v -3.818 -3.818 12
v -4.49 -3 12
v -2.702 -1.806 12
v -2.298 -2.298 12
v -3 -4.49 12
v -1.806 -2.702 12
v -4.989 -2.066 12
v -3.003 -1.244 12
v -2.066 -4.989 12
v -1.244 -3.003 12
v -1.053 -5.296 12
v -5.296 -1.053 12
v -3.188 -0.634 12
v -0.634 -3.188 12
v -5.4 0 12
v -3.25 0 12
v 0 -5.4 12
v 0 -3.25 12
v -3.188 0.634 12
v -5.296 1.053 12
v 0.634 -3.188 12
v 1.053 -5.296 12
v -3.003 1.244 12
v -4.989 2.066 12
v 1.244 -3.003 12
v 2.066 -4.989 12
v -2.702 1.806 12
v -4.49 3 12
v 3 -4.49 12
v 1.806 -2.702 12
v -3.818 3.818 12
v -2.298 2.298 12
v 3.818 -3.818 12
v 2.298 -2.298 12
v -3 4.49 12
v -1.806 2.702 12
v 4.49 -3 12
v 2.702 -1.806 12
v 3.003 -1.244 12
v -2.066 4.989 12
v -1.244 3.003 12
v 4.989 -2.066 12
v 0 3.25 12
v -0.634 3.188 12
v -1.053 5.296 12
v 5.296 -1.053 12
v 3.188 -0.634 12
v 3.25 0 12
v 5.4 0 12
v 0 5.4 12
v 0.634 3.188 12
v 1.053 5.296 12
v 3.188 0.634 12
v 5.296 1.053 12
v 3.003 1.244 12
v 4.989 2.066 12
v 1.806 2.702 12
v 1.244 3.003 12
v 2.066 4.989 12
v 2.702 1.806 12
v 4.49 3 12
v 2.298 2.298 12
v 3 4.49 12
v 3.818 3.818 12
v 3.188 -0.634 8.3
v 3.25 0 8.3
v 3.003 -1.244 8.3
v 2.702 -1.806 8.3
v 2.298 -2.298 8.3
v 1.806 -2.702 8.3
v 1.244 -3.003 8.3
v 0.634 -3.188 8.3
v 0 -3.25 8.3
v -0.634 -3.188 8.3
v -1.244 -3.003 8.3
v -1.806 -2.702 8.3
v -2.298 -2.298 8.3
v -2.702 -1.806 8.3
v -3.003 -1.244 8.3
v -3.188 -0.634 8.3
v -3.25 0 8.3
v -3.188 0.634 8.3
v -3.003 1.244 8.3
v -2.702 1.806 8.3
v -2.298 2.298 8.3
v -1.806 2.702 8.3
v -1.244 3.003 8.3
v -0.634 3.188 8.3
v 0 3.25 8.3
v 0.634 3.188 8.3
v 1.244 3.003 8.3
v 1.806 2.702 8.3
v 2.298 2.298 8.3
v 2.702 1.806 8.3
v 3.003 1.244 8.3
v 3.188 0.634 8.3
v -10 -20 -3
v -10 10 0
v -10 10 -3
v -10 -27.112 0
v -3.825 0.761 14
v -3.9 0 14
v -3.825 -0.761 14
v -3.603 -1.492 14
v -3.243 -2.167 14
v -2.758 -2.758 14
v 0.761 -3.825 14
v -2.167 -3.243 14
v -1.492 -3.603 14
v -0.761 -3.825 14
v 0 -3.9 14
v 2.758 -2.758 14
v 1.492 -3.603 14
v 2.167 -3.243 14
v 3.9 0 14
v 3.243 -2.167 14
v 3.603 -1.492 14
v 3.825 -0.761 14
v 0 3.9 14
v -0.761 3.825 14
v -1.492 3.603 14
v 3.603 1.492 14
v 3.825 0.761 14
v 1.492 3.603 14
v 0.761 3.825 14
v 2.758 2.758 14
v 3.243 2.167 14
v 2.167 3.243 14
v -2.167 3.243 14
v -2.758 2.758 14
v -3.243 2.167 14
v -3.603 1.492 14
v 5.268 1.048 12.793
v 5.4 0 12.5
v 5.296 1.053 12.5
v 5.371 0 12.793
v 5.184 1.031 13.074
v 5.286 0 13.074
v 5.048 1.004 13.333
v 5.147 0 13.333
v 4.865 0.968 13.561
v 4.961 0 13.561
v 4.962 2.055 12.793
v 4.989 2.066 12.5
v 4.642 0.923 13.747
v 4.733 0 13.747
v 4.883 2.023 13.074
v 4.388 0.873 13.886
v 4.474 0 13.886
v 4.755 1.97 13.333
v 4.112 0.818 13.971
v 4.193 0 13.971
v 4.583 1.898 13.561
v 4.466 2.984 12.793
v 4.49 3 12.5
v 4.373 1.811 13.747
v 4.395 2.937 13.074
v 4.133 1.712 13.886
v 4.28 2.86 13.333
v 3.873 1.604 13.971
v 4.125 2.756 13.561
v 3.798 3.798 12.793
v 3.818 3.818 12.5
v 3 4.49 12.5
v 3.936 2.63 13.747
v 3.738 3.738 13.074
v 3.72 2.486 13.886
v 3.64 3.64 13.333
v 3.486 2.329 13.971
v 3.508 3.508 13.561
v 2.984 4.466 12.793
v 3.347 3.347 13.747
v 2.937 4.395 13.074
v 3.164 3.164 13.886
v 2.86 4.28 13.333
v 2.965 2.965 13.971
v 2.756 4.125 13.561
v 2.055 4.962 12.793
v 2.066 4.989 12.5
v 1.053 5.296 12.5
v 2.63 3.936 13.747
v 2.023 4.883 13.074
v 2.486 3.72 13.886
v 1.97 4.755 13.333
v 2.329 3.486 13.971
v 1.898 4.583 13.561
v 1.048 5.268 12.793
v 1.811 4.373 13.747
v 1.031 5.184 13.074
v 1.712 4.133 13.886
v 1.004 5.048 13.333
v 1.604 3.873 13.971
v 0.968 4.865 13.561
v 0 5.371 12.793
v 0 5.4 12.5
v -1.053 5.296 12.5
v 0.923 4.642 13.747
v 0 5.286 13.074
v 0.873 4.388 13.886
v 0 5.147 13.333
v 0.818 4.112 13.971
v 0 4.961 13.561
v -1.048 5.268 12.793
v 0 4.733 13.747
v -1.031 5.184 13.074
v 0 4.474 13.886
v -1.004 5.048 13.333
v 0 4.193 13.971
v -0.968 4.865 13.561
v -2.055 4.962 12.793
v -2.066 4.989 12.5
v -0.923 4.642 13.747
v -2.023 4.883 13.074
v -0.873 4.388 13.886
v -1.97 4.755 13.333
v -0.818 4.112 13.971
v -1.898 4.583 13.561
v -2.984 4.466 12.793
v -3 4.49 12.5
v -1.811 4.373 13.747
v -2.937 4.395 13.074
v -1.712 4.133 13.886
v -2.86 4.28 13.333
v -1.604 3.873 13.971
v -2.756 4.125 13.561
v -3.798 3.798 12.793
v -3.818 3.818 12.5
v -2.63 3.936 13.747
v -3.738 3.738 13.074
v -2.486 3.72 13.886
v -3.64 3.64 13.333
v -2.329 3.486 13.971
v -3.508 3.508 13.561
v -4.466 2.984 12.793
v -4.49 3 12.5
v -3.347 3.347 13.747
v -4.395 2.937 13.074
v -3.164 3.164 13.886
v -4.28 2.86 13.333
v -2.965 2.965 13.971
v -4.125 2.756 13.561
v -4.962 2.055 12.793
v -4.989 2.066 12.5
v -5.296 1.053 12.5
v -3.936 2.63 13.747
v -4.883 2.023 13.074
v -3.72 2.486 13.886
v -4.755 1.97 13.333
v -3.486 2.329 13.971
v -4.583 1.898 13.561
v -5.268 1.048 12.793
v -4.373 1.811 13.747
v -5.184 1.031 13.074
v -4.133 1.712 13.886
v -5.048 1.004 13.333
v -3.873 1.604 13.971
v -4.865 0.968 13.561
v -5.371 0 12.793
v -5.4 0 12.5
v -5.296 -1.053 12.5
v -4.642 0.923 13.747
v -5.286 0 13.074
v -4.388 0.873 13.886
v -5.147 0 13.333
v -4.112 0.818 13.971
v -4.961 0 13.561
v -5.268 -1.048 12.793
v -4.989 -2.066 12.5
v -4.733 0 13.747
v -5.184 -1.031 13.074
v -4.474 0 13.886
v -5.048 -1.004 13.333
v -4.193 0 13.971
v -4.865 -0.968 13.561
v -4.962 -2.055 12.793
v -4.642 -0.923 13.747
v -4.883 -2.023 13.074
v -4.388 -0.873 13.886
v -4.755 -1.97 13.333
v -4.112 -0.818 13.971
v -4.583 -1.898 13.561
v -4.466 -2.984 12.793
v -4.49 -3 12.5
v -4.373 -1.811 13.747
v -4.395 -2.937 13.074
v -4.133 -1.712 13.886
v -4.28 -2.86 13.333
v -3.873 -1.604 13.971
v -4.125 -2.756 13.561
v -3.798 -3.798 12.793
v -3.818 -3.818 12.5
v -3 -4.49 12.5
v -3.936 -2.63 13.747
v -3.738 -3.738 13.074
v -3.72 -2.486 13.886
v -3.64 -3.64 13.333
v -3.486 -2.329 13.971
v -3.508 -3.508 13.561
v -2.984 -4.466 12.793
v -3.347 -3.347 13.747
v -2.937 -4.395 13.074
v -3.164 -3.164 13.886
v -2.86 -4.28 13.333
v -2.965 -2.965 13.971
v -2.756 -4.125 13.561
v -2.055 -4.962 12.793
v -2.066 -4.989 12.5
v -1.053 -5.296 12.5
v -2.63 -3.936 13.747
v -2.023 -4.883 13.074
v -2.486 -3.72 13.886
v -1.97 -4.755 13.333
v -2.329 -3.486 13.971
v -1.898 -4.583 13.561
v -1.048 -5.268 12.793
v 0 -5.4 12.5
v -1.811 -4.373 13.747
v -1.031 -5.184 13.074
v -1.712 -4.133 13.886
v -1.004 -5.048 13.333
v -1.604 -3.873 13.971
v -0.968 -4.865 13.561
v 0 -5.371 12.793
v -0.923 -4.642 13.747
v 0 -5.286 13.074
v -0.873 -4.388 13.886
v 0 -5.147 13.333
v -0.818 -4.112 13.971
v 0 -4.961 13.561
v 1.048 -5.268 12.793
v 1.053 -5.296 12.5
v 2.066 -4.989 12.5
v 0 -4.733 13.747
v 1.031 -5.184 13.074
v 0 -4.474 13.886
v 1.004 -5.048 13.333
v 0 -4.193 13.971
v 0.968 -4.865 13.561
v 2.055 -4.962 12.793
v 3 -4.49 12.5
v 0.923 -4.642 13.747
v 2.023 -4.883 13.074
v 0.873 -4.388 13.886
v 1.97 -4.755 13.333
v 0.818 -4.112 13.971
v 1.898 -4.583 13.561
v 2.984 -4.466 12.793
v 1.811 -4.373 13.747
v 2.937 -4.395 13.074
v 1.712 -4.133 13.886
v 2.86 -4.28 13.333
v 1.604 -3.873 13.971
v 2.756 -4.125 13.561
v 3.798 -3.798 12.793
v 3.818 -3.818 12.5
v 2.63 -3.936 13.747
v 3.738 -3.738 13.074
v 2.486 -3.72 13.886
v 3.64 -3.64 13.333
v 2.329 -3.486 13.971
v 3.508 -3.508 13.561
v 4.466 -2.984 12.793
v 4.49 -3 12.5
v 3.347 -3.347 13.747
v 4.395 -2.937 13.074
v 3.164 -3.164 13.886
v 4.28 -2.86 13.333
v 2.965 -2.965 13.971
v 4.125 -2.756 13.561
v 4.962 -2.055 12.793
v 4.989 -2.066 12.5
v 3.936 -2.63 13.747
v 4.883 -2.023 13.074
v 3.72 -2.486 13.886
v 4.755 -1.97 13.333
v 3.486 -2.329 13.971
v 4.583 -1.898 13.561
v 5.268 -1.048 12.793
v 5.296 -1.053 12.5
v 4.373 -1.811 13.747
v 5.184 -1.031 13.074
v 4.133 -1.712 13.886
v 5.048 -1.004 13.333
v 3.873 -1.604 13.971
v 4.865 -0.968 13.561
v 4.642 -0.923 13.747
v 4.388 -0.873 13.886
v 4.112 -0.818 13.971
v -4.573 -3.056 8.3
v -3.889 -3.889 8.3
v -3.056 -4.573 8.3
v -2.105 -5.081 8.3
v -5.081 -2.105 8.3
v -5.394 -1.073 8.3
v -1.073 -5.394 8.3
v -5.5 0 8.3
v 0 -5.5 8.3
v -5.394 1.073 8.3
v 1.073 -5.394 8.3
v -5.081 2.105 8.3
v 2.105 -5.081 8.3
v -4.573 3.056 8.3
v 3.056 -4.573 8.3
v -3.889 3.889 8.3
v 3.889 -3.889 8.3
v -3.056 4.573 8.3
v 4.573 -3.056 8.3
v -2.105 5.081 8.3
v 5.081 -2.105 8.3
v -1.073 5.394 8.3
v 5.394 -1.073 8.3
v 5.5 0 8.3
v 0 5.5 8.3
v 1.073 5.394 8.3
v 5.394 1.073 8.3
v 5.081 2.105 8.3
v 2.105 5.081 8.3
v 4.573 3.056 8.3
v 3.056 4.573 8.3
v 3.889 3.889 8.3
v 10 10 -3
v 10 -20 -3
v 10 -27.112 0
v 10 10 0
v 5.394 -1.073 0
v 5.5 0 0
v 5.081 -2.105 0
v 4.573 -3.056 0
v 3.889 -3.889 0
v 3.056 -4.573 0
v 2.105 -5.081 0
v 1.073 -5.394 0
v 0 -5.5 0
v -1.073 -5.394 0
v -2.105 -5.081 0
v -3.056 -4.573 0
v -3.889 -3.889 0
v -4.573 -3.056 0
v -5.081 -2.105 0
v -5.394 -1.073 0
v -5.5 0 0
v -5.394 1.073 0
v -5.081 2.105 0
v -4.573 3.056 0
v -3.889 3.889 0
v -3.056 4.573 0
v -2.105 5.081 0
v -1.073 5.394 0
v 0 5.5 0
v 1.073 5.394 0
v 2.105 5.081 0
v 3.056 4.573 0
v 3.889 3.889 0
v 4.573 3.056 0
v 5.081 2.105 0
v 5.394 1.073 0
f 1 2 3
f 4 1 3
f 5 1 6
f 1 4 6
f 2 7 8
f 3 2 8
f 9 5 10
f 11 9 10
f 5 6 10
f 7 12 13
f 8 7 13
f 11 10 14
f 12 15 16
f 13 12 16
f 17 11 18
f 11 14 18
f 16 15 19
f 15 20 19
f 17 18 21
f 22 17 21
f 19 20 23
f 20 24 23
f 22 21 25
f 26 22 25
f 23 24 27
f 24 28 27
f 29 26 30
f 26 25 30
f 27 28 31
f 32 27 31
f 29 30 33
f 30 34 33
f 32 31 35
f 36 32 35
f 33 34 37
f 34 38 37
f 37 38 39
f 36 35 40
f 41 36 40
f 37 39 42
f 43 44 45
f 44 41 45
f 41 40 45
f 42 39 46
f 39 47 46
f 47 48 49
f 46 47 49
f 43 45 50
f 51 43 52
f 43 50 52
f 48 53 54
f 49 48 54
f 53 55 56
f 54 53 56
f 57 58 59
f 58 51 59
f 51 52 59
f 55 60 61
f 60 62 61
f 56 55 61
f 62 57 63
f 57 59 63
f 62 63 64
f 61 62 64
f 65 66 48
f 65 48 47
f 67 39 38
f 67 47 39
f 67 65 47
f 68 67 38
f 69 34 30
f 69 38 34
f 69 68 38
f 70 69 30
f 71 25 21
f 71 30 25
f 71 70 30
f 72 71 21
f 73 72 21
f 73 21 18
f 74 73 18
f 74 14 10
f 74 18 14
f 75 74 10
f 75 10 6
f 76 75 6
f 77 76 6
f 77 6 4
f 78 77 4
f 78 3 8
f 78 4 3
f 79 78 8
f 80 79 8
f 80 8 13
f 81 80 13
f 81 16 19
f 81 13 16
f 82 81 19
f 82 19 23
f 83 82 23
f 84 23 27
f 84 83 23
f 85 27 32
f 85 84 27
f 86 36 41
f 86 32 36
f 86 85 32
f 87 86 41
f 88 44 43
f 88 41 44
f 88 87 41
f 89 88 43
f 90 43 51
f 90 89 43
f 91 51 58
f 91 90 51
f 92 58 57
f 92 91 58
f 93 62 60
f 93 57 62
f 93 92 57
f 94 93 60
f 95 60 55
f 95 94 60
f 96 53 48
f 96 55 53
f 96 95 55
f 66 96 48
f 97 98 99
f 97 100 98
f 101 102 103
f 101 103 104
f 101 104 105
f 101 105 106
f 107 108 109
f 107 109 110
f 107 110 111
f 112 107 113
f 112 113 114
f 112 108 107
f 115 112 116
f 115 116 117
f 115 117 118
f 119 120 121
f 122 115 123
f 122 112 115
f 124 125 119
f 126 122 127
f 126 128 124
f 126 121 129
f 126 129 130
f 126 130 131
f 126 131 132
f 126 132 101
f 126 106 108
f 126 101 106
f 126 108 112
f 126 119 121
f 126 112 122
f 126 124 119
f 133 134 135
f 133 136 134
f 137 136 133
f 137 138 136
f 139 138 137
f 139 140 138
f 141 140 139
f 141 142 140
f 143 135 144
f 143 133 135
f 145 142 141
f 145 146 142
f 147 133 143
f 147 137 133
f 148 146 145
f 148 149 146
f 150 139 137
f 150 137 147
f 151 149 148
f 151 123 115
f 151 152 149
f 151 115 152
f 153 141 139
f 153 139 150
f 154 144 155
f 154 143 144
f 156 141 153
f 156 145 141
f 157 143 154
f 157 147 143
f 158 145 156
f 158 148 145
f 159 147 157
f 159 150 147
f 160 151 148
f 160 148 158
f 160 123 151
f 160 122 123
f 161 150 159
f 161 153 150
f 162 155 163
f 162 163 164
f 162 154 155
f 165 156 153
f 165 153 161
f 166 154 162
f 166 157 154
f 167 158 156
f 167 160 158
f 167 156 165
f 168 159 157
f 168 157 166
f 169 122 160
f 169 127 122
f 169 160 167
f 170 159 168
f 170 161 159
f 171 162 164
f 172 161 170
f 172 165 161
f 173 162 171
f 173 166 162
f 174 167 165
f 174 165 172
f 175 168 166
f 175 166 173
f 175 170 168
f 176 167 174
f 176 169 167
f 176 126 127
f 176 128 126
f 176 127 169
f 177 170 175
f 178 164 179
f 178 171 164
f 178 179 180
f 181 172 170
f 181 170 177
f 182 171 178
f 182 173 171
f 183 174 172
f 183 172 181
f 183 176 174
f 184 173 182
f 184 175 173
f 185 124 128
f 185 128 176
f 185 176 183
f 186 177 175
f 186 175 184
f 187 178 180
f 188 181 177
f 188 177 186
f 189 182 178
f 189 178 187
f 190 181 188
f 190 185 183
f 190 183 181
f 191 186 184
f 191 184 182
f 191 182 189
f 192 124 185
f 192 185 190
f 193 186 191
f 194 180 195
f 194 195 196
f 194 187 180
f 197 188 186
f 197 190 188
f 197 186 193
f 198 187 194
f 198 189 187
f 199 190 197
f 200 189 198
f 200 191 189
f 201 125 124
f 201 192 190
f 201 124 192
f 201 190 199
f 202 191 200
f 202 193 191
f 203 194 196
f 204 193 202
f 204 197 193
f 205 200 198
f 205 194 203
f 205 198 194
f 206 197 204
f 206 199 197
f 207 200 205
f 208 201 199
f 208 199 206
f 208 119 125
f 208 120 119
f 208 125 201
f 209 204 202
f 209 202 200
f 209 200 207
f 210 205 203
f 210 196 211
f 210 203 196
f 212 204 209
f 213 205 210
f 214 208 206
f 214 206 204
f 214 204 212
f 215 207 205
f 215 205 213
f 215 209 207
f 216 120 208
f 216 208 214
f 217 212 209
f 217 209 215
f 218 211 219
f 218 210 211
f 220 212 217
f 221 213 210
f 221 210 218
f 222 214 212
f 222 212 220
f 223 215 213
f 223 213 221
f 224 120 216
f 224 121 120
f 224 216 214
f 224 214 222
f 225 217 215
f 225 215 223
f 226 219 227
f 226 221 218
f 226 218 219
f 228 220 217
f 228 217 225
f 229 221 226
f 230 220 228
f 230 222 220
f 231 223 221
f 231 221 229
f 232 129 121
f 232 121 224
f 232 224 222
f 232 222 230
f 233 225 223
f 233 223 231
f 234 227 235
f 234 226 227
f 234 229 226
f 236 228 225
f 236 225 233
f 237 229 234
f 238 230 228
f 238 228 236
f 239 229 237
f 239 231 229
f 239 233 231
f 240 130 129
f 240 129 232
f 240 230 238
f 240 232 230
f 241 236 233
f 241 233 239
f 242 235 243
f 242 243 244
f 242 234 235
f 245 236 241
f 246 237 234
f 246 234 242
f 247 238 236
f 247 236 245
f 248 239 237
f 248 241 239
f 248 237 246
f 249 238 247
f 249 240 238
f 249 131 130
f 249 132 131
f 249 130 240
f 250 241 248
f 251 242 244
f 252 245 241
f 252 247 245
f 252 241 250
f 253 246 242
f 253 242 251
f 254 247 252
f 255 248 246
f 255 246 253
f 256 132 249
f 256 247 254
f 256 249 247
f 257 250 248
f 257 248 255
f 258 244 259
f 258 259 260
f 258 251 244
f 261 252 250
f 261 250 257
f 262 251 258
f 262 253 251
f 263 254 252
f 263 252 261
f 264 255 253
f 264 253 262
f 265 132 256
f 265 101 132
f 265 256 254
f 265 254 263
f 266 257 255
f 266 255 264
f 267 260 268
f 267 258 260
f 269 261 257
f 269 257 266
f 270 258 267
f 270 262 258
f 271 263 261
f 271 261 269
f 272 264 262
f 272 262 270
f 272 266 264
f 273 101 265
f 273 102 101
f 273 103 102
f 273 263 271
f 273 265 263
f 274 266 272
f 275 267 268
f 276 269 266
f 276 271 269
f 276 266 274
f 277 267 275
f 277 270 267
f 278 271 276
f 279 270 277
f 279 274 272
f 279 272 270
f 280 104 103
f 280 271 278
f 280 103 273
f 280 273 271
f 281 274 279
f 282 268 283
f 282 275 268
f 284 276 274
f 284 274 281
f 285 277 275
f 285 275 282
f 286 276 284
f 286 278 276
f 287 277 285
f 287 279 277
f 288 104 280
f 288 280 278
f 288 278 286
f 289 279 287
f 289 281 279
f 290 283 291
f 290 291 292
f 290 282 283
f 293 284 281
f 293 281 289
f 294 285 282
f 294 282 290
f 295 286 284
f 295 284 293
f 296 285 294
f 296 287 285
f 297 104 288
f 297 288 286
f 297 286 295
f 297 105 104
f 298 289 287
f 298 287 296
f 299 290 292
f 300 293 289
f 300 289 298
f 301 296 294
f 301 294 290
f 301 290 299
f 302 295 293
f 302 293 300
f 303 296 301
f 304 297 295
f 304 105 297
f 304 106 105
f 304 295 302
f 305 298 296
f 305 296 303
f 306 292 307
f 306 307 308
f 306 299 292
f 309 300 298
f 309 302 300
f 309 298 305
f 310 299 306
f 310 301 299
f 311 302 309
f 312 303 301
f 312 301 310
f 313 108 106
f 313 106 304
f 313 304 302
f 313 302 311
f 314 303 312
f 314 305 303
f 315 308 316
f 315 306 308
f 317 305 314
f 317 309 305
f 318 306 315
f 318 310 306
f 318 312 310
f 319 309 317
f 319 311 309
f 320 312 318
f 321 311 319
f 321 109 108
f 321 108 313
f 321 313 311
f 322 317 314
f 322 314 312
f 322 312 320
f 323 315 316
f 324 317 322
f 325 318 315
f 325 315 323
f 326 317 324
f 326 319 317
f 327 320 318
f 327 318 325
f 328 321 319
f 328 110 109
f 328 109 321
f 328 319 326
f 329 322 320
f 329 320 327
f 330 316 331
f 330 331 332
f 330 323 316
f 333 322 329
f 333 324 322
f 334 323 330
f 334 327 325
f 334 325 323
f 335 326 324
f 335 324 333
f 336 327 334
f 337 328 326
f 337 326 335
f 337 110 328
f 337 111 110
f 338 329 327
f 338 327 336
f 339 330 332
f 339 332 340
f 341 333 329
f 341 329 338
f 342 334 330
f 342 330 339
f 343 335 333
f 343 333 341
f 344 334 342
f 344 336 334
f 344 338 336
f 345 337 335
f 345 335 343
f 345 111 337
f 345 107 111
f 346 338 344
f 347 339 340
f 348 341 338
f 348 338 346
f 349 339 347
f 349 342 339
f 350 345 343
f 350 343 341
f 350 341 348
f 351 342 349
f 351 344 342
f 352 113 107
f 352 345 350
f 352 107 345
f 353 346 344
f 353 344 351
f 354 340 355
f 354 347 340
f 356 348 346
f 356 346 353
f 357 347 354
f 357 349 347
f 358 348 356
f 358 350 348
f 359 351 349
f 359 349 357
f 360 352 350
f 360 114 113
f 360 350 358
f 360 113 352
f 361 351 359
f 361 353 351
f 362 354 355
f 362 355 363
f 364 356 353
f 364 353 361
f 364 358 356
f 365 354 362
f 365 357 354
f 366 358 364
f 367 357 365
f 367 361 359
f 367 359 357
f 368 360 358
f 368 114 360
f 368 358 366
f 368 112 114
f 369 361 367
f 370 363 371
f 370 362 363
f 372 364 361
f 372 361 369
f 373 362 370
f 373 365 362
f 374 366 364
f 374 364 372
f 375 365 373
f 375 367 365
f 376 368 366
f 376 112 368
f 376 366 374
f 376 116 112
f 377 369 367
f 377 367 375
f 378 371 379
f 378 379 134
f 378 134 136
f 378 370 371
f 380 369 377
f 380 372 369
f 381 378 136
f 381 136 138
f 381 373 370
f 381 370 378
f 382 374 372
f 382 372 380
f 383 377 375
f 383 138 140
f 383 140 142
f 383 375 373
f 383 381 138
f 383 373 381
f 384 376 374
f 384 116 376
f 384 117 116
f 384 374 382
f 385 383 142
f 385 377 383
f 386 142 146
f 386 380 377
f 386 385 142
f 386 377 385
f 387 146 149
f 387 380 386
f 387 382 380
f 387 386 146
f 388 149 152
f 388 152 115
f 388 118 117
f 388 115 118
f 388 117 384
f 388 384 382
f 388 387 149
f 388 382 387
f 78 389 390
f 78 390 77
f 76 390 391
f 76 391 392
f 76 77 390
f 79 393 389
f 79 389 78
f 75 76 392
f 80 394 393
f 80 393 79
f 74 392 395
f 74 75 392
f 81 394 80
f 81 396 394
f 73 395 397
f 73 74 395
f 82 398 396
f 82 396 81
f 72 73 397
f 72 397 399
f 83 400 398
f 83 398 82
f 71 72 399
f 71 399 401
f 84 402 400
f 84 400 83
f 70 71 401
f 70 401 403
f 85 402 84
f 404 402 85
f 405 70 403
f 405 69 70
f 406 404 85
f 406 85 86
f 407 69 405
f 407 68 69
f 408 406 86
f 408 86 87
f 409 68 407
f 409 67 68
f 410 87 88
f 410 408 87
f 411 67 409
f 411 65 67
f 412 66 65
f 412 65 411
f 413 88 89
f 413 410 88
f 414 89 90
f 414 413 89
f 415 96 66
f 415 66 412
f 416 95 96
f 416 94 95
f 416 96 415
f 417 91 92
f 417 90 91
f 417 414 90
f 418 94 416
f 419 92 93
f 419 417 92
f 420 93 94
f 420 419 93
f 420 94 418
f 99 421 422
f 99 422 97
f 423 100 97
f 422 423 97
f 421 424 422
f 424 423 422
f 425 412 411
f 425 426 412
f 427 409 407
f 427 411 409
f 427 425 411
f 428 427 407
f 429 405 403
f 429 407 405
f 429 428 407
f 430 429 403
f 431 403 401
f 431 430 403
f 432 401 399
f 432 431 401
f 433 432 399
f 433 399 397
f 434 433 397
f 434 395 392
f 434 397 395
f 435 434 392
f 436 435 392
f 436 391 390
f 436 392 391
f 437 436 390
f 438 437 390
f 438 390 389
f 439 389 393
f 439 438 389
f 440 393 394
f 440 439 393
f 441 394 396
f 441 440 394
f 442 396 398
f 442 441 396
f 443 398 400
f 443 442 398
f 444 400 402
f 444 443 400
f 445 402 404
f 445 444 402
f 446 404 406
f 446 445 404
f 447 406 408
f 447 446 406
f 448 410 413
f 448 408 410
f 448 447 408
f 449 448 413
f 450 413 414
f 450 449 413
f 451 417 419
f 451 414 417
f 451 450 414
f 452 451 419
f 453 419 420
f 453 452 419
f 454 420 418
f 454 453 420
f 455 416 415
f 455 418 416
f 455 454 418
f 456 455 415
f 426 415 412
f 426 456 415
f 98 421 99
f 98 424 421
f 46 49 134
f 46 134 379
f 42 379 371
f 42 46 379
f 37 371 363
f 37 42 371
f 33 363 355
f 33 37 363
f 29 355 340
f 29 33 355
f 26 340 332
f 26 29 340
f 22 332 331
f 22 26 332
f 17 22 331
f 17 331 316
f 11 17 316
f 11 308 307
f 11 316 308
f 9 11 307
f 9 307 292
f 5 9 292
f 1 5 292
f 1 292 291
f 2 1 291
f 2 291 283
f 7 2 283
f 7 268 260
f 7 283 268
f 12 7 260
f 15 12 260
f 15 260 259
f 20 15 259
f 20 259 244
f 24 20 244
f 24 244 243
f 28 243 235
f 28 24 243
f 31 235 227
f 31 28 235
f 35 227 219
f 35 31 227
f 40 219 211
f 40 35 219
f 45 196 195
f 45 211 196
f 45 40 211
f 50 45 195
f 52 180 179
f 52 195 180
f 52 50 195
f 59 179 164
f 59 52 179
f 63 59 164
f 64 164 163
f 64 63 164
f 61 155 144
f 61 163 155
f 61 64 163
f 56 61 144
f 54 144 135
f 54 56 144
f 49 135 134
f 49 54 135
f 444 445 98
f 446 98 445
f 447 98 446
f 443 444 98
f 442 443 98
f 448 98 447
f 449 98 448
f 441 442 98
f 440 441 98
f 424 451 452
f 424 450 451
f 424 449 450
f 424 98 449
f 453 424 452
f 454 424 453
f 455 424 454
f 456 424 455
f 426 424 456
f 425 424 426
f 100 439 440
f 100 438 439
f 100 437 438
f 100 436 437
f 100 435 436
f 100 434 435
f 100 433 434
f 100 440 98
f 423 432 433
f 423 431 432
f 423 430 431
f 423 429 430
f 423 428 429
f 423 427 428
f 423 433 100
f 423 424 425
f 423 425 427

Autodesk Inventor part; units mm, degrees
ref_plane "YZ Plane" through (0, 0, 0) normal (1, 0, 0) x (0, 1, 0)
ref_plane "XZ Plane" through (0, 0, 0) normal (0, 1, 0) x (-1, 0, 0)
ref_plane "XY Plane" through (0, 0, 0) normal (0, 0, 1) x (1, 0, 0)
sketch "Sketch1" plane through (0, 0, 0) normal (0, 0, 1) x (1, 0, 0)
  circle A0 centre (0, 0) radius 5.5
  dimension "d0" = 11
extrude "Extrusion1" add sketch "Sketch1" along normal blind 8.3
sketch "Sketch2" plane through (0, 0, 8.3) normal (0, 0, 1) x (1, 0, 0)
  circle A0 centre (0, 0) radius 3.25
  dimension "d3" = 6.5
extrude "Extrusion2" add sketch "Sketch2" along normal blind 3.7
sketch "Sketch3" plane through (0, 0, 12) normal (0, 0, 1) x (1, 0, 0)
  circle A0 centre (0, 0) radius 5.4
  dimension "d6" = 10.8
extrude "Extrusion3" add sketch "Sketch3" along normal blind 2
fillet "Fillet1" radius 1.5 1 edges at (-5.4, 0, 14)
sketch "Sketch4" plane through (0, 0, 0) normal (0, 0, -1) x (-1, 0, 0)
  line L0 (-10, 10) -> (10, 10)
  line L1 (10, 10) -> (10, -20)
  line L2 (10, -20) -> (-10, -20)
  line L3 (-10, -20) -> (-10, 10)
  point P0 (0, 0)
  dimension "d10" = 20
  dimension "d11" = 30
  dimension "d12" = 10
  dimension "d13" = 10
extrude "Extrusion4" add sketch "Sketch4" along normal blind 3
sketch "Sketch5" plane through (10, -20, 0) normal (1, 0, 0) x (0, 0, -1)
  line L0 (0, 0) -> (0, -6)
  line L1 (0, -6) -> (0, -7.1122)
  line L2 (0, -7.1122) -> (3, 0)
  line L3 (3, 0) -> (0, 0)
  point P0 (0, 20)
  dimension "d16" = 6
extrude "Extrusion5" add sketch "Sketch5" against normal up to surface (20 mm away)
equation "\"d13\" = 0.5 * d10"
properties part number "vtail_body_piece"
